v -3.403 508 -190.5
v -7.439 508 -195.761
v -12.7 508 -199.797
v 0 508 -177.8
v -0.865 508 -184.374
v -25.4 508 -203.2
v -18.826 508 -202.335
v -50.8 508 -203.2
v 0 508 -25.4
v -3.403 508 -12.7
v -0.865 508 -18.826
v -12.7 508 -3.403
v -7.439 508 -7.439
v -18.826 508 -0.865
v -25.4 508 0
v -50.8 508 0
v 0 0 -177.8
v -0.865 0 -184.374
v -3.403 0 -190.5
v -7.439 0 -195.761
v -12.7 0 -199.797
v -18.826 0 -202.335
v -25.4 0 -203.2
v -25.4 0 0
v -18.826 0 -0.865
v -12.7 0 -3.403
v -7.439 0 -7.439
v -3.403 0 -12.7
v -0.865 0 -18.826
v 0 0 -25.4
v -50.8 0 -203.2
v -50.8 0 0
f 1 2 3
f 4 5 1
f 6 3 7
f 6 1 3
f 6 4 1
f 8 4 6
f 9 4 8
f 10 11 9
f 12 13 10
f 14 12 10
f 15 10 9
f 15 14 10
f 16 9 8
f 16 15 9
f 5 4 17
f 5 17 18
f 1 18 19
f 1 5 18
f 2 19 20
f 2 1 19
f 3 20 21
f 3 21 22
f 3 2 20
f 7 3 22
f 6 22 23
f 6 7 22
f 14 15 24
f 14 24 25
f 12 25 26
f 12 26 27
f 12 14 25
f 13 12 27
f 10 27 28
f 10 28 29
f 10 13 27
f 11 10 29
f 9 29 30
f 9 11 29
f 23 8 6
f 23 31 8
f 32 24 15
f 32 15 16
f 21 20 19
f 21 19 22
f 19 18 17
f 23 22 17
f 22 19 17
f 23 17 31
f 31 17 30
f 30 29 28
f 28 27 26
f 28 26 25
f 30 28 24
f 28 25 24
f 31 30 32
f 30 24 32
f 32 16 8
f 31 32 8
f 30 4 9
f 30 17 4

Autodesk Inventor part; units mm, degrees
ref_plane "XZ Plane" through (0, 0, 0) normal (0, 1, 0) x (-1, 0, 0)
ref_plane "XY Plane" through (0, 0, 0) normal (0, 0, 1) x (1, 0, 0)
sketch "Sketch1" plane through (0, 0, 0) normal (0, 1, 0) x (-1, 0, 0)
  line L0 (0, 0) -> (50.8, 0)
  line L1 (50.8, 0) -> (50.8, -203.2)
  line L2 (50.8, -203.2) -> (0, -203.2)
  line L3 (0, -203.2) -> (0, 0)
  dimension "d0" = 50.8
  dimension "d1" = 203.2
extrude "Extrusion1" add sketch "Sketch1" along normal blind 508
fillet "Fillet1" radius 25.4 1 edges at (0, 254, 0)
fillet "Fillet2" radius 25.4 1 edges at (0, 254, -203.2)
ref_plane "Work Plane1" through (-25.4, 0, 0) normal (1, 0, 0) x (0, 1, 0)
properties part number "SailPost-ver2-1111-2021"
